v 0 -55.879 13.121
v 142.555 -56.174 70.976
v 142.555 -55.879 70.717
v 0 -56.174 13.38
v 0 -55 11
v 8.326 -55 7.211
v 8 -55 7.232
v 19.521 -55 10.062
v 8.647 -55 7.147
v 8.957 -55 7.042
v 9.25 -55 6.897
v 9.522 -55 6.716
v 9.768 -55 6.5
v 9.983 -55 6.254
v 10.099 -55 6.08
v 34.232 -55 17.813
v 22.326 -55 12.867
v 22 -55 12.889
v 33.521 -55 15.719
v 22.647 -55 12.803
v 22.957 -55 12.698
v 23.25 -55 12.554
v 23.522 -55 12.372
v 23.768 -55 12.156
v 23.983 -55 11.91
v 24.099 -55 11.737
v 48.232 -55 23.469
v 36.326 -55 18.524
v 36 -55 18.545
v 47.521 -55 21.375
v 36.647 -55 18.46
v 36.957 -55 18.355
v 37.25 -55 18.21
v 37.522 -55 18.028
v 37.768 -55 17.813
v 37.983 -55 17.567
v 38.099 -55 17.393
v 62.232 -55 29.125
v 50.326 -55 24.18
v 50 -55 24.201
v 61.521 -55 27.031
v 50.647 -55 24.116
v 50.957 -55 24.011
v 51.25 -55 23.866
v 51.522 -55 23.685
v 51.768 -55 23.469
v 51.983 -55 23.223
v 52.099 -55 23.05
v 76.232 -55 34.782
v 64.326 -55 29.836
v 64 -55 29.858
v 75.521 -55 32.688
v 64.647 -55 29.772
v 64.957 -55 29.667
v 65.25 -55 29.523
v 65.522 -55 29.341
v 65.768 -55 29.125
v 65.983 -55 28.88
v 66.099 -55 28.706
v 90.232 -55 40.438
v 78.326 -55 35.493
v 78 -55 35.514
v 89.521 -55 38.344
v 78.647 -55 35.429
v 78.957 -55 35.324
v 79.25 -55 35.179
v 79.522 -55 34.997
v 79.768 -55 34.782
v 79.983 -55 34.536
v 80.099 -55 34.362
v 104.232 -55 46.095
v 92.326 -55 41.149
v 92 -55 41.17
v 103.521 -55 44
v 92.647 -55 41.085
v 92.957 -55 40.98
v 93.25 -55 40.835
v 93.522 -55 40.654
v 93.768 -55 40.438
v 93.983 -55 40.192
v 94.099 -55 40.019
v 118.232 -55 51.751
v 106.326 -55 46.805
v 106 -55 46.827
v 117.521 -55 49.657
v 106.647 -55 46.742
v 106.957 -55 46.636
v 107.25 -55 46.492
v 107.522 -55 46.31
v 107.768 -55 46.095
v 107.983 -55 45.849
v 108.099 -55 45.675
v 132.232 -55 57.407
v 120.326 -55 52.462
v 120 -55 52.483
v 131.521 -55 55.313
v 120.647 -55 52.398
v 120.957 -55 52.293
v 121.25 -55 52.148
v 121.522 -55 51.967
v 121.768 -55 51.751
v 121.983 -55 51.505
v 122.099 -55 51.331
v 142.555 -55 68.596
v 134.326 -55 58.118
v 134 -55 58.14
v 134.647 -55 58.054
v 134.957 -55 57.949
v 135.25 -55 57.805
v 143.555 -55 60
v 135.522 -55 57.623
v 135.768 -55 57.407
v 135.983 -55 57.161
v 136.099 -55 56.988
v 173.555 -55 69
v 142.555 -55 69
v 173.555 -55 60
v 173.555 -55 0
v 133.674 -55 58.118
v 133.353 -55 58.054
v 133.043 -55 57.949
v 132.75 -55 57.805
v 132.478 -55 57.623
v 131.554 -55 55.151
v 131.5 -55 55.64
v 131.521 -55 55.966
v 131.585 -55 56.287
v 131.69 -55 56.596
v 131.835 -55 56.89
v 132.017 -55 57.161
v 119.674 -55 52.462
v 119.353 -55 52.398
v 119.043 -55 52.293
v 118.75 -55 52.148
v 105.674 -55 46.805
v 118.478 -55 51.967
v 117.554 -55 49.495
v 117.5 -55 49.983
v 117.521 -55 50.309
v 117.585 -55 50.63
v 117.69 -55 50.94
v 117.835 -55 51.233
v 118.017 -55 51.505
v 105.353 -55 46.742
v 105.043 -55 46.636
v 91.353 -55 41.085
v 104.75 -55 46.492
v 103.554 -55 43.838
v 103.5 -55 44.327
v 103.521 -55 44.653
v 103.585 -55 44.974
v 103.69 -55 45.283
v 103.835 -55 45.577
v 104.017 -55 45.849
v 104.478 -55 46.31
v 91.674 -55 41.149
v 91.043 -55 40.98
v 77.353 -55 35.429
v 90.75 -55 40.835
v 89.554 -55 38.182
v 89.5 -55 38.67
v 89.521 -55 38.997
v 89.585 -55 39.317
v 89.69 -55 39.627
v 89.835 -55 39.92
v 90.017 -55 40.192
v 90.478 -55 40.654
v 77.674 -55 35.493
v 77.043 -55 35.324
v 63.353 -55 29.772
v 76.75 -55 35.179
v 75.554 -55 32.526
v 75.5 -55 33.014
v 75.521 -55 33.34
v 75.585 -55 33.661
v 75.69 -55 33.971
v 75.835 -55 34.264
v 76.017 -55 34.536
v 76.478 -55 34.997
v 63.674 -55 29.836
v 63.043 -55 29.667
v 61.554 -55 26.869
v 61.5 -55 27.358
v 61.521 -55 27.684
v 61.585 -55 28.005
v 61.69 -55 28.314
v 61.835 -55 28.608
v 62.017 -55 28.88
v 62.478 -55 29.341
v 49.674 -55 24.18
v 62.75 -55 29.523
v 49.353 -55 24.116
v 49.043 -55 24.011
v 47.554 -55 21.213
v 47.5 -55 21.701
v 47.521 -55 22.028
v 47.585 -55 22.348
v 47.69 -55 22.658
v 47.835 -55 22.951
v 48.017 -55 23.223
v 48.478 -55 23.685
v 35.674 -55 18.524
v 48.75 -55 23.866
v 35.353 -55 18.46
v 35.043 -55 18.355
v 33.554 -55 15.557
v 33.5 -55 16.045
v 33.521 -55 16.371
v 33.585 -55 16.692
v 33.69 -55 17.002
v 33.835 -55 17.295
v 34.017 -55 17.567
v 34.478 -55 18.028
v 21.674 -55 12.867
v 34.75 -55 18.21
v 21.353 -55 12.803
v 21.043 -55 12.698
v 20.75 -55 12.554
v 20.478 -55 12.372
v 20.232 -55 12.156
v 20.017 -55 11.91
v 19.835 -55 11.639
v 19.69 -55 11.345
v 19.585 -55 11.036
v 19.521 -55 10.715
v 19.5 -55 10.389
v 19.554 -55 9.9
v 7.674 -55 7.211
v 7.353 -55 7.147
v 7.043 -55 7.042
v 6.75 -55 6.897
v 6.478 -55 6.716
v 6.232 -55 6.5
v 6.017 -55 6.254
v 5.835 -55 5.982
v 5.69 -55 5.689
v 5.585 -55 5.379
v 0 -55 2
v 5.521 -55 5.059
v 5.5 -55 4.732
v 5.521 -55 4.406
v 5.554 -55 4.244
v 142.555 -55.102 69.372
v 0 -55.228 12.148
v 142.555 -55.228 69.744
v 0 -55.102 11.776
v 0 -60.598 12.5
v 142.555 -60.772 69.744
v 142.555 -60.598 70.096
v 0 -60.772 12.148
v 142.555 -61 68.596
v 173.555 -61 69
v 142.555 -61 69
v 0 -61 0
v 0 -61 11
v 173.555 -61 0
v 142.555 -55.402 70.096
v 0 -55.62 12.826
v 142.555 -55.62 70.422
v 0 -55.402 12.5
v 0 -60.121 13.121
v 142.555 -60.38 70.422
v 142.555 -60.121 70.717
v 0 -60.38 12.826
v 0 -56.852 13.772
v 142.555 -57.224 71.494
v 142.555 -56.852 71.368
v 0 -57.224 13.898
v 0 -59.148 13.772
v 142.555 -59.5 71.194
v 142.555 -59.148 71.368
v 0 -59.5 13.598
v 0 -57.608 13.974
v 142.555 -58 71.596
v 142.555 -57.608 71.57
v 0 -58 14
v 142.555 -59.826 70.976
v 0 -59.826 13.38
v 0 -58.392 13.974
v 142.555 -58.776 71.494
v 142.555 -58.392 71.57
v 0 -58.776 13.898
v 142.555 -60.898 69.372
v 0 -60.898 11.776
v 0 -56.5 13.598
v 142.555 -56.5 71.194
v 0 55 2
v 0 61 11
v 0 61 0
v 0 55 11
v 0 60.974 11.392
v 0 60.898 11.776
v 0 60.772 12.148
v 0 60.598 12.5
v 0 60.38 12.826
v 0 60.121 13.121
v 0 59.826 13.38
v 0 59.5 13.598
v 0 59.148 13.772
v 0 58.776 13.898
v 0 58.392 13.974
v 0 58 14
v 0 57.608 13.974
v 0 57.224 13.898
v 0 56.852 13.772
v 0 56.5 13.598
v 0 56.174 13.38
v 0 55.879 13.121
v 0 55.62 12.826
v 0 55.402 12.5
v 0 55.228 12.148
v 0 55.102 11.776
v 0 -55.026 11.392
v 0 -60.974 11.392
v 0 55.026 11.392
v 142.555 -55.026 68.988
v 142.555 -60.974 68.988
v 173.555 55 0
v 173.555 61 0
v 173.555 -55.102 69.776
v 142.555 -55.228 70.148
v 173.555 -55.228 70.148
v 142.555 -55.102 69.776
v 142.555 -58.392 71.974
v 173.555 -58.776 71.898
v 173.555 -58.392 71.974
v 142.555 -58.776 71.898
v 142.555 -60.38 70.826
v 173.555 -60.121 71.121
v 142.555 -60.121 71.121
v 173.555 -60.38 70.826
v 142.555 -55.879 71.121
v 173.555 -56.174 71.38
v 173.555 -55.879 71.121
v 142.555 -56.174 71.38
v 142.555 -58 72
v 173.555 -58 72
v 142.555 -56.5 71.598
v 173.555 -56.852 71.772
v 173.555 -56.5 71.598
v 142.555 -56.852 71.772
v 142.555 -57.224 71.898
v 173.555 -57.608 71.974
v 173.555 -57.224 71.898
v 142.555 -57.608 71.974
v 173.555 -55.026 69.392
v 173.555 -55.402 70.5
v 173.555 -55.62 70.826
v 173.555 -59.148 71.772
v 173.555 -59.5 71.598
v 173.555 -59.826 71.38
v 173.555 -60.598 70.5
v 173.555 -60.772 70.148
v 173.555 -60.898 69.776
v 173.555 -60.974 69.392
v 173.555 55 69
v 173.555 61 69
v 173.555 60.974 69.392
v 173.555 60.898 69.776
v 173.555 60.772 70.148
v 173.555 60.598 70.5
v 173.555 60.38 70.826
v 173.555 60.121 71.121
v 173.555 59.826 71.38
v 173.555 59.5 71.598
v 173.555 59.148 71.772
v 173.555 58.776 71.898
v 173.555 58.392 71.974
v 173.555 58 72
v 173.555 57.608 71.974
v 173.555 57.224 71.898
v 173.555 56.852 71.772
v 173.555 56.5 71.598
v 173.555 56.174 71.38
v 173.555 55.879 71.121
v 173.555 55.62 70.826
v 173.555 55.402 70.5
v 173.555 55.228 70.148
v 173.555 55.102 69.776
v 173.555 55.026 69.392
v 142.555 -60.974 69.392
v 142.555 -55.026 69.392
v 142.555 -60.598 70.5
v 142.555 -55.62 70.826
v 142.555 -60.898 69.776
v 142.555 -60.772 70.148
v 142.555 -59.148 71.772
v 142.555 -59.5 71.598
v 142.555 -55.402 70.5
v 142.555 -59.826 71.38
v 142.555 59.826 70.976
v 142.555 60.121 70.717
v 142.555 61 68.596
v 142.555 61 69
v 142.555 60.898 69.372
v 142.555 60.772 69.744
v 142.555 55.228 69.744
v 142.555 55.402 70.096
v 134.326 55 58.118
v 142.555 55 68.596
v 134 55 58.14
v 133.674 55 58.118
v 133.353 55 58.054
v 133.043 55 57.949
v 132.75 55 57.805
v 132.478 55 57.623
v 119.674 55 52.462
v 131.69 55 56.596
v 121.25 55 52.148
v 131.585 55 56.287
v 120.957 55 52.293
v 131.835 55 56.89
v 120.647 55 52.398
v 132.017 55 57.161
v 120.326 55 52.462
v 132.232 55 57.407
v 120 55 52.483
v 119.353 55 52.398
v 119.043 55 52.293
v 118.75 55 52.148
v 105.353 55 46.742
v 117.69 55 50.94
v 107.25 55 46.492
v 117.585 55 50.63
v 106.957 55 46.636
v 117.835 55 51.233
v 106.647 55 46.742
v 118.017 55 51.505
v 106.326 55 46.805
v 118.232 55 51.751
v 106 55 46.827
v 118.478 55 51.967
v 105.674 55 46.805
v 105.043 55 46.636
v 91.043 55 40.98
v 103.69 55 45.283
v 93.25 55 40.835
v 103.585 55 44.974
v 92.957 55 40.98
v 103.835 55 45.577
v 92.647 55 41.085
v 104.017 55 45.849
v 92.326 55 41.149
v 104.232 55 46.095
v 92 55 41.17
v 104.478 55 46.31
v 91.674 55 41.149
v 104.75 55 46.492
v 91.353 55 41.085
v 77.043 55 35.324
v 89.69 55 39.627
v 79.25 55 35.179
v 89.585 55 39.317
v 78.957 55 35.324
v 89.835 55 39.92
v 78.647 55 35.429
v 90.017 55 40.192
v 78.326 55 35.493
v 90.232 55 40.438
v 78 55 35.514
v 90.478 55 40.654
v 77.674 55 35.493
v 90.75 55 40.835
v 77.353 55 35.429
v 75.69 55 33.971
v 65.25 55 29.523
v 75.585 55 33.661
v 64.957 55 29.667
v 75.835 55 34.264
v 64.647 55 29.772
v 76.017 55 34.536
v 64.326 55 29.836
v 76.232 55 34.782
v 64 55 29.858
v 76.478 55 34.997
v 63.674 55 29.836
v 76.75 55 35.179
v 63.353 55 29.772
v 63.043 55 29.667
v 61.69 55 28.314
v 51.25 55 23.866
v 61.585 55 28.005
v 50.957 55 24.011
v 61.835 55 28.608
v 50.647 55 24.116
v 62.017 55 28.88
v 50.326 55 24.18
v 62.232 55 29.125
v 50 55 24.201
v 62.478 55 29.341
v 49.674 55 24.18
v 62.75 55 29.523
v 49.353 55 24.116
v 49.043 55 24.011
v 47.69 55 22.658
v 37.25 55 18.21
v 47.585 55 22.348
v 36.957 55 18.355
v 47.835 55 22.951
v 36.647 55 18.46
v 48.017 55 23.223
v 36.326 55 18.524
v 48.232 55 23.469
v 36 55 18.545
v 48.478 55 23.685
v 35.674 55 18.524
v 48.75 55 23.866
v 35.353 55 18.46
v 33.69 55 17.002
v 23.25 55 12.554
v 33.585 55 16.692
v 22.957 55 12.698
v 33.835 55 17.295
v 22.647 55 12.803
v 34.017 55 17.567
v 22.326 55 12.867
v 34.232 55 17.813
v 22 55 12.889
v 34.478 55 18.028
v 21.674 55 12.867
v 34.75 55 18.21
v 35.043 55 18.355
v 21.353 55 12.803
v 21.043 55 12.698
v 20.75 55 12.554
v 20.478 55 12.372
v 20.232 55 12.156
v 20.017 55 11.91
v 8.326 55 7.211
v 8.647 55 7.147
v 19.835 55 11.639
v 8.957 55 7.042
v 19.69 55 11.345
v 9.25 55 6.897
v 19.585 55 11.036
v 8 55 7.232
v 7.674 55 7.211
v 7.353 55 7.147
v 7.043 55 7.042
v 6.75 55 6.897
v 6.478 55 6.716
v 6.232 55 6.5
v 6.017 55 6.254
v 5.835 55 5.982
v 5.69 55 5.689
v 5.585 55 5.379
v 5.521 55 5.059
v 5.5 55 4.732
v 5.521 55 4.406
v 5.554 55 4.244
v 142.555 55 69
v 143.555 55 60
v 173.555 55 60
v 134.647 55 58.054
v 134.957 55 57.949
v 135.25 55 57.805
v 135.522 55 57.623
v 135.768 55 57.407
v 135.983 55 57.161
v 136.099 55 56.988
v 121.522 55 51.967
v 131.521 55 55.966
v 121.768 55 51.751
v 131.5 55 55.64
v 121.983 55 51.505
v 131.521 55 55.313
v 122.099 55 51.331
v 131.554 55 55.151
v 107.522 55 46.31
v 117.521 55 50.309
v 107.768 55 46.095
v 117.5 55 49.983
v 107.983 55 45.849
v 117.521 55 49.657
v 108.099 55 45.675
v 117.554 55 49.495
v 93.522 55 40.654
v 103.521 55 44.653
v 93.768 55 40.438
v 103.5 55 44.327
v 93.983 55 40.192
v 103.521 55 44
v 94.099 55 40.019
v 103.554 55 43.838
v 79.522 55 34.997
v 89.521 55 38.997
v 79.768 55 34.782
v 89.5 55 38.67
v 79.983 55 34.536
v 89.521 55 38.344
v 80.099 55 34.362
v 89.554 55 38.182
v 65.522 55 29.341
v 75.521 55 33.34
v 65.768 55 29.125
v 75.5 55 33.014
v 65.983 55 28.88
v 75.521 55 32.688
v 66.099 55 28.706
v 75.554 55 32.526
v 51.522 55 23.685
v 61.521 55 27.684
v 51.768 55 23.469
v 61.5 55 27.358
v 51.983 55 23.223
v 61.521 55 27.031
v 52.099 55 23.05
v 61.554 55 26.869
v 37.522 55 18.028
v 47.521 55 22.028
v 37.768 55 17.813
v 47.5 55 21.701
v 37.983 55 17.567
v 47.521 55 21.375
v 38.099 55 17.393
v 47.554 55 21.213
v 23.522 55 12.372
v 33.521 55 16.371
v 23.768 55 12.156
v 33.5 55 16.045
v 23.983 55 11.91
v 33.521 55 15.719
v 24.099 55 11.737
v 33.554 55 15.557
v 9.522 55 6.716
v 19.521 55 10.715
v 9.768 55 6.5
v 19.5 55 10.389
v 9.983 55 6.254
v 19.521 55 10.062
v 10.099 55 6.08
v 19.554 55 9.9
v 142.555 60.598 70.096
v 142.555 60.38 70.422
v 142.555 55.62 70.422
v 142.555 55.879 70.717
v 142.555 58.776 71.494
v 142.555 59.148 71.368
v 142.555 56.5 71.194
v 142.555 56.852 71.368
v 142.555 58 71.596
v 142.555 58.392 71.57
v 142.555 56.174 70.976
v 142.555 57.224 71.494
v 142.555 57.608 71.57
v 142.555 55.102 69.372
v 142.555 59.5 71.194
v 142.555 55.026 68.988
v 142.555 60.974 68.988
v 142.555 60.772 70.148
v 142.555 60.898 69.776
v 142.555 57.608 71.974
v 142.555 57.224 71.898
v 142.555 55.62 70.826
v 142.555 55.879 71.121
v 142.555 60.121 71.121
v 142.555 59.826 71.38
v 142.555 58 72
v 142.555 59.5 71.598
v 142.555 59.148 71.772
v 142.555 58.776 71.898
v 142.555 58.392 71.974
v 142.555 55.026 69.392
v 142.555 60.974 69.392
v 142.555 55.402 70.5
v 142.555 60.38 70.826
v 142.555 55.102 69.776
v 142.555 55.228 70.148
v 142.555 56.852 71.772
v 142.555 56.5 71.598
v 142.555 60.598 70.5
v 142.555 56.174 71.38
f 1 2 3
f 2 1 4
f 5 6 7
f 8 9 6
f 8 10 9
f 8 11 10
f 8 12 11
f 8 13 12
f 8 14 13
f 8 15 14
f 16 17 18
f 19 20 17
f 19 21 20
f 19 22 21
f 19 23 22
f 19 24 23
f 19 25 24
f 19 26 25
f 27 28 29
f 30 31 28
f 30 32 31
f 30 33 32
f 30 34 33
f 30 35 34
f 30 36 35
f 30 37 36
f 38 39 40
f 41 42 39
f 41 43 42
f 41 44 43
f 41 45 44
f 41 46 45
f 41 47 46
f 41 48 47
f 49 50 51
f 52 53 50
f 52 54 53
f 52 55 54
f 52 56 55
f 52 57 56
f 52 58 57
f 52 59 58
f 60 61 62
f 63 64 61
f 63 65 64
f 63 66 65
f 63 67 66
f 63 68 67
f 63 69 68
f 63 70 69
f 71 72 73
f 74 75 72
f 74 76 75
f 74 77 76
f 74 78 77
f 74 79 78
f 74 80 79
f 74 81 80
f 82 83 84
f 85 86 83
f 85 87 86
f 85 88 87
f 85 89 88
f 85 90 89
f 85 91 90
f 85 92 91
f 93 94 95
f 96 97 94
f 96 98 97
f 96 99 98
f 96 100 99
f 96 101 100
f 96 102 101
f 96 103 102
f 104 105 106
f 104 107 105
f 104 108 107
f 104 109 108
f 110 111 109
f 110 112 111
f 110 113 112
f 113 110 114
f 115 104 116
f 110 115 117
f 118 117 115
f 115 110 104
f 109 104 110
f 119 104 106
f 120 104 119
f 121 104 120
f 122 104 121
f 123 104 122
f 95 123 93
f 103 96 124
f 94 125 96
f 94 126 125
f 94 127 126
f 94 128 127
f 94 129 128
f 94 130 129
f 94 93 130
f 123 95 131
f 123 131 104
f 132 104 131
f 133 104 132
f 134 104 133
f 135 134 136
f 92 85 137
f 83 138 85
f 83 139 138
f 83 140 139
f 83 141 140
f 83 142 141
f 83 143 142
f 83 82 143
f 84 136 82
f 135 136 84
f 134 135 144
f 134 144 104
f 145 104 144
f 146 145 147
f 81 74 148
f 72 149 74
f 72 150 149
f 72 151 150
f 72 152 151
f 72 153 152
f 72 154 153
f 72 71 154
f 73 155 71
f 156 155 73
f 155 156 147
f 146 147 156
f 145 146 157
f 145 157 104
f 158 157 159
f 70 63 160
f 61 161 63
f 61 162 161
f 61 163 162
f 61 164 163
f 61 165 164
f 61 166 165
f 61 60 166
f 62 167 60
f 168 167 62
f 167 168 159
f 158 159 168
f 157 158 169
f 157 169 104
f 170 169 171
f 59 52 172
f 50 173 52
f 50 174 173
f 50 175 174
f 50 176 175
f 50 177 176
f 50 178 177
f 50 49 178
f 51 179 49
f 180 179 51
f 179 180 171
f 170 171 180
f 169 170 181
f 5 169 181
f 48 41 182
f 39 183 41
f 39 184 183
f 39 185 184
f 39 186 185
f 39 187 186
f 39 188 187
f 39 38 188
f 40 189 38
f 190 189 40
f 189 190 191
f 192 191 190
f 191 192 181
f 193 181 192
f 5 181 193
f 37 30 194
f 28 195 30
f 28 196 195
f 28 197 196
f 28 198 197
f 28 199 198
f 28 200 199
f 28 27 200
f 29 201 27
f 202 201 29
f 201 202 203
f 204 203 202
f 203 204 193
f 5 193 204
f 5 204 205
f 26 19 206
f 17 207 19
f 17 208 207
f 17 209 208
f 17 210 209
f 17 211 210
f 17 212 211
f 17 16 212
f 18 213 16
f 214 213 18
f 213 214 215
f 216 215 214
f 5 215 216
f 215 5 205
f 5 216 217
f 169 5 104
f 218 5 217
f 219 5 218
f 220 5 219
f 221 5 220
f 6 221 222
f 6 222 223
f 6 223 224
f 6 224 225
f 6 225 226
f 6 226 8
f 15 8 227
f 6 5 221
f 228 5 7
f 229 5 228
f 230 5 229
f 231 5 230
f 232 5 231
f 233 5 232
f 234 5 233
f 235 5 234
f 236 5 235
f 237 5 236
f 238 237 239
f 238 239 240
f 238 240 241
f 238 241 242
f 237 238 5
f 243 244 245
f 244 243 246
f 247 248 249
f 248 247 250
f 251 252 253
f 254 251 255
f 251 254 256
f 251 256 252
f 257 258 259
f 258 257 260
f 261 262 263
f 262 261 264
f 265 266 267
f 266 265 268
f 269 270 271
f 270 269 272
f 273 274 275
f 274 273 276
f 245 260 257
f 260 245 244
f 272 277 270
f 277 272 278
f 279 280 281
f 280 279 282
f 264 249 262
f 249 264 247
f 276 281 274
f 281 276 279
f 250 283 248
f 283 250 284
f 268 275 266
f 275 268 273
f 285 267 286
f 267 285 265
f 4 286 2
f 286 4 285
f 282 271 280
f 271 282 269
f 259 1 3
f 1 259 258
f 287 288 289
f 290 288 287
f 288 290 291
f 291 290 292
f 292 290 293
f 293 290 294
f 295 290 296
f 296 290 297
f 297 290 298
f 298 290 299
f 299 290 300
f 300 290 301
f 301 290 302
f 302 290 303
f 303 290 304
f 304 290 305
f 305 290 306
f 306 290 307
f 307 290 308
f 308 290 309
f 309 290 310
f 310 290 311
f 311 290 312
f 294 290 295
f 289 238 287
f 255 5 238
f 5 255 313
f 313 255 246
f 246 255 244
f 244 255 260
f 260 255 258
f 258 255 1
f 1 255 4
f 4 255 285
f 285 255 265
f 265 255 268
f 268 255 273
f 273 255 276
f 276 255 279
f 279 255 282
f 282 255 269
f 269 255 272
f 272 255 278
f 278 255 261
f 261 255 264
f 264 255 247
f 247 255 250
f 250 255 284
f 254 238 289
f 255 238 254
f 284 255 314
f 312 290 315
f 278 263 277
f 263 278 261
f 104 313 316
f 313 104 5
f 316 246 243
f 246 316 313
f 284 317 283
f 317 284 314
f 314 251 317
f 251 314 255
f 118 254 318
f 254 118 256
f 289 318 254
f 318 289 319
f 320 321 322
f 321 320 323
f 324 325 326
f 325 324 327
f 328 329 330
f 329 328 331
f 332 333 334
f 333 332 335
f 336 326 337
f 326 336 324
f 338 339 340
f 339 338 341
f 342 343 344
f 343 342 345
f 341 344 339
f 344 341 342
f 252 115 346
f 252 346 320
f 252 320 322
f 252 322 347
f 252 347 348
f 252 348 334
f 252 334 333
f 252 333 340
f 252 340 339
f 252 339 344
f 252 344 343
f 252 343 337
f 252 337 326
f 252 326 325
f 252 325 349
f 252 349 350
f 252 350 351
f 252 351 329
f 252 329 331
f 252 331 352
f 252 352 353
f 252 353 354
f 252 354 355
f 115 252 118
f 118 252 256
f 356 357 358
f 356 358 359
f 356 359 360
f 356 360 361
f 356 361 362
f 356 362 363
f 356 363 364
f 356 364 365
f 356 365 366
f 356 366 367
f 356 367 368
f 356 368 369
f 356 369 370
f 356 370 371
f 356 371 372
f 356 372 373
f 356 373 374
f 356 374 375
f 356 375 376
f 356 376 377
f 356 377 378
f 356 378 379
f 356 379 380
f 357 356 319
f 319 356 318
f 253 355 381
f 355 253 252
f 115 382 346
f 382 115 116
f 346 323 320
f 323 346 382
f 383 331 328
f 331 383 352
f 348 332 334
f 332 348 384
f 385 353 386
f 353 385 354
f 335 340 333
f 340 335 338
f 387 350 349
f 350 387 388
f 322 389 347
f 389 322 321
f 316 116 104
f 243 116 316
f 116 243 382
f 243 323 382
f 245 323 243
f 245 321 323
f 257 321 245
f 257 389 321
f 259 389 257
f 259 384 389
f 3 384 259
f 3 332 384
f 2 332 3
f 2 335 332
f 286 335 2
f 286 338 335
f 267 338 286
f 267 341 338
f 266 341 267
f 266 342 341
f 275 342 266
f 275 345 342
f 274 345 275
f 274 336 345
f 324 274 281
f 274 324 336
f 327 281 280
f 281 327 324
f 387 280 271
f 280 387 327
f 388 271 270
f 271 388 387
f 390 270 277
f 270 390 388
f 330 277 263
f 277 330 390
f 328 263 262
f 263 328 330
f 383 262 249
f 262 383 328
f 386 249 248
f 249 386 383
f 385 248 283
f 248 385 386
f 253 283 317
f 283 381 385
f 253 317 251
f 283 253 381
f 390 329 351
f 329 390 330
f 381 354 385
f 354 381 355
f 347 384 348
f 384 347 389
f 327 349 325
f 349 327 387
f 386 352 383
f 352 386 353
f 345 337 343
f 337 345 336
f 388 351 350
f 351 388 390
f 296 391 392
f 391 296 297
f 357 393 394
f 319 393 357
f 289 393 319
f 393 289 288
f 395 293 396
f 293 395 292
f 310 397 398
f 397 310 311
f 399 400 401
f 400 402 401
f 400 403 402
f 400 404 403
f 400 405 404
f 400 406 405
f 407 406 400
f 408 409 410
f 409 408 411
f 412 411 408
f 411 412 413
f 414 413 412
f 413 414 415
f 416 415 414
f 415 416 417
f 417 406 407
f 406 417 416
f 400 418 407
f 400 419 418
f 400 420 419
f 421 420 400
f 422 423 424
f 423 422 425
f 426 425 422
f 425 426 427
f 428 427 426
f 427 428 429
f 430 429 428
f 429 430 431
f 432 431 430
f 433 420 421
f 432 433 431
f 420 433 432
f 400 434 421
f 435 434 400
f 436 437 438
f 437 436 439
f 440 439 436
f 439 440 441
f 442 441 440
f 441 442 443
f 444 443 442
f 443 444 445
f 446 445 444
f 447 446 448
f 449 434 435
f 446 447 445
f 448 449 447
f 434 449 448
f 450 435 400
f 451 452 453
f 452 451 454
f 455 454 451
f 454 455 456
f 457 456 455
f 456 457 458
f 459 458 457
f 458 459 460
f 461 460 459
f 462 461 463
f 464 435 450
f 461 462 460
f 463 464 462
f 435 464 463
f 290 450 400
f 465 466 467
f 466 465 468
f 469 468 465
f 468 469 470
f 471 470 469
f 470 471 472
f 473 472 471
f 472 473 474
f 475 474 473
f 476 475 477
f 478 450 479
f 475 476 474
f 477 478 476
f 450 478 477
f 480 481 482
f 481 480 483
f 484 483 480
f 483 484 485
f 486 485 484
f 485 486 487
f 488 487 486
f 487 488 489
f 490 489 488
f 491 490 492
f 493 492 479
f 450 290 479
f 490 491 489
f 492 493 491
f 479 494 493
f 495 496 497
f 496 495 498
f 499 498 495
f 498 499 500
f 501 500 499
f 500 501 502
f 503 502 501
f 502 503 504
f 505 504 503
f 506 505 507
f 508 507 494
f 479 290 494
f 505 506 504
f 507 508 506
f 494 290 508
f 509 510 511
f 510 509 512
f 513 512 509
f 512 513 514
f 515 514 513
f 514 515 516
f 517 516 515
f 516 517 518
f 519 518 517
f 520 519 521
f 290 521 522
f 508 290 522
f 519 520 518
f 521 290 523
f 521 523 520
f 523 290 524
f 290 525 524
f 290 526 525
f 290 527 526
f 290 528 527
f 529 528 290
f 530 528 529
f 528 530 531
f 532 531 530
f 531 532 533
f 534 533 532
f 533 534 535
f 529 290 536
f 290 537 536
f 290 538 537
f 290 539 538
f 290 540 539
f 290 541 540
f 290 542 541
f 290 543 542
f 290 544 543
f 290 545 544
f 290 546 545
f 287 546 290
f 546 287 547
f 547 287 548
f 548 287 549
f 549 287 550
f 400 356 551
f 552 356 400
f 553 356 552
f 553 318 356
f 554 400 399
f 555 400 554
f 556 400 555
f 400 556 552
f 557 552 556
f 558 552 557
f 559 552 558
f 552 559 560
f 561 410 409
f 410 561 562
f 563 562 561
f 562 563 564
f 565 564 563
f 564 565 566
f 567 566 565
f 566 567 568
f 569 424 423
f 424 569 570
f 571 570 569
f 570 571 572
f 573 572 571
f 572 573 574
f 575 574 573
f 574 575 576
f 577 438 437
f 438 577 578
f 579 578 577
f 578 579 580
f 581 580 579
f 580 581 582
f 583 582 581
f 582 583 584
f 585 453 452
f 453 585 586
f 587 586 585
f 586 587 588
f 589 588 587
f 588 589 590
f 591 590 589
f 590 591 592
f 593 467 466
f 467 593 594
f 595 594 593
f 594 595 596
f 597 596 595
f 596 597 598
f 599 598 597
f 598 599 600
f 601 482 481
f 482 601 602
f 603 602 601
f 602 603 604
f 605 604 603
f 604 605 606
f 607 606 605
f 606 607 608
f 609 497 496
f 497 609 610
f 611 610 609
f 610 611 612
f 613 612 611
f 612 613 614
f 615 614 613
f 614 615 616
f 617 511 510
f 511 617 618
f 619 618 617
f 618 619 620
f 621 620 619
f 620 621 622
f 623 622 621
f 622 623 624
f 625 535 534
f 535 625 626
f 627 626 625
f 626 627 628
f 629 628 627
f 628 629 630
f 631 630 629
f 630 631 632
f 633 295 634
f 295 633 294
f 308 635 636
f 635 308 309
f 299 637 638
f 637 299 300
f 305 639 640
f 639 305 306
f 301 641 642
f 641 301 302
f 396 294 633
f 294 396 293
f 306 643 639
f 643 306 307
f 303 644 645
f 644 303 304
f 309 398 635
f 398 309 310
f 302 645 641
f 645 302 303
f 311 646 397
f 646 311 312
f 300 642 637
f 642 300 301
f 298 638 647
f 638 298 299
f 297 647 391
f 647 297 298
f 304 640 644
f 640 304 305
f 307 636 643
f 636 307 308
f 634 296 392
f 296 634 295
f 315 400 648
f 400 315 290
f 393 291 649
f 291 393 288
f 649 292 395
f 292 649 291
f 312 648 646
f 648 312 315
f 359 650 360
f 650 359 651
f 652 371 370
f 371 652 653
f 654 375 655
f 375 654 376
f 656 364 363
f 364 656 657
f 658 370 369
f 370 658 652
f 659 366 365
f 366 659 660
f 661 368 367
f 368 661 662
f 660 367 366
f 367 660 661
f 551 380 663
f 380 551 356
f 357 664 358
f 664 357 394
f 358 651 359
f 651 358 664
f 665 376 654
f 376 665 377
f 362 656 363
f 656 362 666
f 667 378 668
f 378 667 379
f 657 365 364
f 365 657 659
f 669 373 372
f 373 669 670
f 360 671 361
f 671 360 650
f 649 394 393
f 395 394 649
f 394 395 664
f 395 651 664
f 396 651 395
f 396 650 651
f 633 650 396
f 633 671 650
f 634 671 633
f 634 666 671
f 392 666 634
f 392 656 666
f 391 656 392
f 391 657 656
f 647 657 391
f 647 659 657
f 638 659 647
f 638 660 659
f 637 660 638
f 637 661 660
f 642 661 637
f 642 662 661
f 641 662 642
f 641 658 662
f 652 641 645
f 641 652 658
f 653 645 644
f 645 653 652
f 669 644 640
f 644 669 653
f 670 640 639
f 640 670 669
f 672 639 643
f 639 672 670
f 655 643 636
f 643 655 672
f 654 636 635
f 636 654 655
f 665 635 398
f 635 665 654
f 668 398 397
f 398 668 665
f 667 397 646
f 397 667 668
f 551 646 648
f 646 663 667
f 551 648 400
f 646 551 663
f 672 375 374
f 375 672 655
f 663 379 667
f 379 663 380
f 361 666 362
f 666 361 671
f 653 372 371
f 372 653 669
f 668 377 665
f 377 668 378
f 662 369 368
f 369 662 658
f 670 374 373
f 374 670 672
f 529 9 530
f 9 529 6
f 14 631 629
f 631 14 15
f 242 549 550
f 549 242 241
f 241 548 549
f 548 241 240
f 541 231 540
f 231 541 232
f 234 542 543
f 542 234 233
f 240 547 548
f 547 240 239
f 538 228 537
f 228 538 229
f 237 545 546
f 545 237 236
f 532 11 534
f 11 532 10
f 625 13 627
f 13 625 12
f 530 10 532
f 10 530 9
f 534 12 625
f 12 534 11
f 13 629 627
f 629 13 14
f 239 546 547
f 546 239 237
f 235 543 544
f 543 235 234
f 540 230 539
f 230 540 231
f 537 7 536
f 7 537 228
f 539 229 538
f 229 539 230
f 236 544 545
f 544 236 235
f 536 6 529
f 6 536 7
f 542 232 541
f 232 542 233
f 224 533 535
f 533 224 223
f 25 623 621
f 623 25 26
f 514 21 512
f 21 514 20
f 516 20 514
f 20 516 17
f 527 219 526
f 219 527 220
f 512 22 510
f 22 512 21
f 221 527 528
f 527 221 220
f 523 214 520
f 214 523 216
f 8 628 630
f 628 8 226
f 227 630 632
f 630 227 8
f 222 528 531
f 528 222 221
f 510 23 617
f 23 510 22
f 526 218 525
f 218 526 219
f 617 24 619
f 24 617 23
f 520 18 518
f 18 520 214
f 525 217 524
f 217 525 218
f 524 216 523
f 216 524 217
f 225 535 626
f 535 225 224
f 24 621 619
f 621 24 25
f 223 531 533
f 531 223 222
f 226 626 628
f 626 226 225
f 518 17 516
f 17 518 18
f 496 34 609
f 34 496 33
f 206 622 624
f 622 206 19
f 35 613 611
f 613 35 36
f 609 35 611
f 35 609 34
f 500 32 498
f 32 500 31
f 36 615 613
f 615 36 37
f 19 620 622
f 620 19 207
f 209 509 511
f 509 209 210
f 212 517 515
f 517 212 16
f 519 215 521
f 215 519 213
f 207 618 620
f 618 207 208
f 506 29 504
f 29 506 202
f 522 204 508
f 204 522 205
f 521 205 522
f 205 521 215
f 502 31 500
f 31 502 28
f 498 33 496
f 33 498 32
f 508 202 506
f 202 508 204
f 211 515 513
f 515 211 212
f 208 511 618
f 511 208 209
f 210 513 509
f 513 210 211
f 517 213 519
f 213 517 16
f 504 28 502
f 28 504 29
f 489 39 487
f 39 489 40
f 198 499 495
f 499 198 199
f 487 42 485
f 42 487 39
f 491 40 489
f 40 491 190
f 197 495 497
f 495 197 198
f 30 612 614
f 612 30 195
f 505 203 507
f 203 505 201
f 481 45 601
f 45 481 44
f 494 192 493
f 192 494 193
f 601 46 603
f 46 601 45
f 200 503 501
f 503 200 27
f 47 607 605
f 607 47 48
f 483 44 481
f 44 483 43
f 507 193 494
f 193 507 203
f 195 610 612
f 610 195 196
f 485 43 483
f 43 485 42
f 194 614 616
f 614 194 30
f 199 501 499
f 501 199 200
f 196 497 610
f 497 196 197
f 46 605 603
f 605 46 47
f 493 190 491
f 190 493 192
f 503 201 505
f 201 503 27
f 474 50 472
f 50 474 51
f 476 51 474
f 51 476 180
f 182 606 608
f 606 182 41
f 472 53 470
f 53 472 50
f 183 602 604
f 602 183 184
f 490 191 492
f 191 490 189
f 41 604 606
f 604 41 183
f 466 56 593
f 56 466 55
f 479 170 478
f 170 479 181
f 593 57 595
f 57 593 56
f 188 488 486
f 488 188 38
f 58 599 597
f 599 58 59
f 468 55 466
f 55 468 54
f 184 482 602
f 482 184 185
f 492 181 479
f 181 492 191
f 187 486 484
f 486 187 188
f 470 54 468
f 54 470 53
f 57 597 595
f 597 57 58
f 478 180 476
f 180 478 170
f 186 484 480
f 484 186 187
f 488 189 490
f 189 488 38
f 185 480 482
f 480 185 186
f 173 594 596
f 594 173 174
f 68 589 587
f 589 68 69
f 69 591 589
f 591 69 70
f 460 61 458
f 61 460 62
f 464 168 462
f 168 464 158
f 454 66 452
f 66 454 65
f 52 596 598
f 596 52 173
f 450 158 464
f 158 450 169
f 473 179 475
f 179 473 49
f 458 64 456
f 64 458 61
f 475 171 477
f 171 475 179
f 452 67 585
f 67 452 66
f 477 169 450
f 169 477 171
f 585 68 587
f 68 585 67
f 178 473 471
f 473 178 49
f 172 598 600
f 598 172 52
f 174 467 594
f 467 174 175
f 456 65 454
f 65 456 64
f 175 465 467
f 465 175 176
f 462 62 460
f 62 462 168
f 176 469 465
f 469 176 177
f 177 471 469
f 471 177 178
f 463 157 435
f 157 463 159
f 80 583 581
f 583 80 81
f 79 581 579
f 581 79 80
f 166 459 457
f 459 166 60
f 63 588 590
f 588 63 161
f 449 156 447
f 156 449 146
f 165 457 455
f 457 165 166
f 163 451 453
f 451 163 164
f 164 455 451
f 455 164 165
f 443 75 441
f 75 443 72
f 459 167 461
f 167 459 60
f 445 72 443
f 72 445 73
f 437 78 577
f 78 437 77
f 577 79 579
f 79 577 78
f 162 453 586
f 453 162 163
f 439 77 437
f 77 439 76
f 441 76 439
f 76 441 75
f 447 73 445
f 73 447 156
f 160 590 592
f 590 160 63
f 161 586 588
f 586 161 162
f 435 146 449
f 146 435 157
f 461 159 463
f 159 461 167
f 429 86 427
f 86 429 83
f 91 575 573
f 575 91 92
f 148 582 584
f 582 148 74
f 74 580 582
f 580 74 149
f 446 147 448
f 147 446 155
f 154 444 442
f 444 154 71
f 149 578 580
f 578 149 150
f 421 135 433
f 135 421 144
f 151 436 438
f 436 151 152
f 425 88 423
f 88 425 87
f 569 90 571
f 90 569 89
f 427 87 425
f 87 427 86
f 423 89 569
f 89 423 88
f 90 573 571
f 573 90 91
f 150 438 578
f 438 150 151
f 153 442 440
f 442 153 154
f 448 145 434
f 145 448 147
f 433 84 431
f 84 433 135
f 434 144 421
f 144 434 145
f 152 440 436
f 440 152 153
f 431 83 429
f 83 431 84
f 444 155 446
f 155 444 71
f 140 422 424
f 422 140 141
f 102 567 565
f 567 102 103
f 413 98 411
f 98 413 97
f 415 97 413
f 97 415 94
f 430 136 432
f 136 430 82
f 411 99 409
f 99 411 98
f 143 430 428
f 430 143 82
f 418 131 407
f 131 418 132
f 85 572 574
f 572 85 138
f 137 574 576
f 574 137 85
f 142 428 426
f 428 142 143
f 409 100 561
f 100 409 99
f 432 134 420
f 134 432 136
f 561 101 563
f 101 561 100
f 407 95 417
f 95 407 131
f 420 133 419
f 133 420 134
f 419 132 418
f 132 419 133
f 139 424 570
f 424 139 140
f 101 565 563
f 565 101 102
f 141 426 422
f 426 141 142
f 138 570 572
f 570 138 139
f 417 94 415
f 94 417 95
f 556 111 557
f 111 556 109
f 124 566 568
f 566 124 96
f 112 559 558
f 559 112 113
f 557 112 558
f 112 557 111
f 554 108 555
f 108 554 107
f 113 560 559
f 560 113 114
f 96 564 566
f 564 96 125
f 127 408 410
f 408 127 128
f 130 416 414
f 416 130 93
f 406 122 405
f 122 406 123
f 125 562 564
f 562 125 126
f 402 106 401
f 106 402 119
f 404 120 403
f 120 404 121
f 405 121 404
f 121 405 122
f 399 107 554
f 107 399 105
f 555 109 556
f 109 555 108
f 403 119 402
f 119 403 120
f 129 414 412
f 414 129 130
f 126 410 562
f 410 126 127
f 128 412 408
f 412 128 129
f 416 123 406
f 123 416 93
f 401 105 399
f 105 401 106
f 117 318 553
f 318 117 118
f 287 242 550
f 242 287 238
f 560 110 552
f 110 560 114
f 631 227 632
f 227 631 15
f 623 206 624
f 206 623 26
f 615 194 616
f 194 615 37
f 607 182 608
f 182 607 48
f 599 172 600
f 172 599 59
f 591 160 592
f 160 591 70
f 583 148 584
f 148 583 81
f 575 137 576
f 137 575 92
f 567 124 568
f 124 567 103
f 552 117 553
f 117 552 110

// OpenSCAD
// ============================================================
//  BROUTILLE — rampe de marche pour juvénile
//  - franchit une bordure (planche, parpaing, bord de bac) de
//    hauteur réglable, 60 mm par défaut
//  - pente de 22° au plus : un juvénile la monte sans glisser,
//    et la descend sans basculer sur le dos
//  - nervures rondes en travers, tous les 14 mm : prise pour les
//    griffes, rien de coupant
//  - côtés bas et arrondis : la tortue ne tombe pas sur le côté,
//    et reste visible
//  - palier en haut, au niveau de la bordure ; une rampe de chaque
//    côté pour passer dans les deux sens
//  - au-delà de 236 mm, la rampe est coupée en tronçons qui
//    s'emboîtent par une queue d'aronde verticale
//
//  À plat, sans supports, pour un plateau de 256 x 256 mm.
//  Repère : X = montée (pied en X = 0), Y = largeur, Z = haut.
// ============================================================

piece   = "rampe"; // [rampe, assemblage]
troncon = 0;       // quel tronçon, si la rampe est coupée (0 = pied)

/* [Bordure] */
hauteur = 60;     // hauteur de la bordure à franchir, en mm
pente   = 22;     // angle de la montée, 25° au plus

/* [Rampe] */
larg    = 110;    // largeur de passage entre les côtés
pied    = 2;      // épaisseur au pied
palier  = 30;     // palier en haut, contre la bordure
cote_e  = 6;      // épaisseur d'un côté
cote_h  = 12;     // hauteur d'un côté au-dessus de la marche
pas     = 14;     // écart des nervures
nerv_d  = 5;      // diamètre des nervures
nerv_s  = 2;      // saillie des nervures

/* [Tronçons] */
l_max   = 236;    // longueur maximale d'un tronçon, sans la queue d'aronde
jeu     = 0.25;   // jeu de l'emboîtement, de chaque côté
qa_col  = 14;     // largeur du col de la queue d'aronde
qa_bout = 22;     // largeur du bout
qa_l    = 14;     // longueur

$fn = 48;

assert(pente <= 25, "pente trop forte : 25° au plus");
assert(hauteur > pied + 5, "bordure trop basse");

// ------------------------------------------------------------
tp   = tan(pente);
x_h  = (hauteur - pied)/tp;   // fin de la montée
L    = x_h + palier;          // longueur totale
W    = larg + 2*cote_e;       // largeur totale
n    = ceil(L/l_max);         // nombre de tronçons
coupes = [for (k = [0 : n]) k*L/n];
function z_marche(x) = x >= x_h ? hauteur : pied + x*tp;

module corps() {
    rotate([90, 0, 0]) linear_extrude(W, center = true)
        polygon([[0, 0], [L, 0], [L, hauteur], [x_h, hauteur], [0, pied]]);
}

// section d'un côté, dans le plan YZ : droit, dessus en demi-rond
module section_cote(h) {
    translate([-cote_e/2, -200]) square([cote_e, 200 + h - cote_e/2]);
    translate([0, h - cote_e/2]) circle(d = cote_e);
}
module cote(yc) {
    // montée : la section est cisaillée le long de la pente, elle reste verticale
    intersection() {
        multmatrix([[1, 0, 0, 0], [0, 1, 0, yc], [tp, 0, 1, 0], [0, 0, 0, 1]])
            rotate([90, 0, 90]) linear_extrude(x_h) section_cote(pied + cote_h);
        translate([-1, -W, 0]) cube([x_h + 2, 2*W, hauteur + cote_h + 10]);
    }
    // palier
    translate([x_h - 1, yc, 0]) rotate([90, 0, 90]) linear_extrude(palier + 1)
        intersection() { section_cote(hauteur + cote_h); translate([-W, 0]) square([2*W, hauteur + cote_h + 10]); }
}

module nervures() {
    for (x = [8 : pas : x_h - 6])
        translate([x, 0, z_marche(x) + nerv_s - nerv_d/2]) rotate([90, 0, 0])
            cylinder(d = nerv_d, h = larg + 1, center = true);
}

module rampe() {
    corps();
    for (s = [-1, 1]) cote(s*(larg/2 + cote_e/2));
    nervures();
}

// queue d'aronde : vue de dessus, le col sur la coupe, le bout dans le tronçon suivant
module aronde2d(j = 0) {
    polygon([[-1, -qa_col/2 - j], [0, -qa_col/2 - j], [qa_l + j, -qa_bout/2 - j],
             [qa_l + j, qa_bout/2 + j], [0, qa_col/2 + j], [-1, qa_col/2 + j]]);
}
function h_tenon(x) = min(35, z_marche(x) - 6 - qa_bout/2);
module tenon(x) { translate([x - 0.5, 0, 0]) linear_extrude(h_tenon(x)) translate([0.5, 0]) aronde2d(); }
// mortaise : ouverte en dessous et sur la coupe, plafond en toit à 45°, rien à ponter
module mortaise(x) {
    h = h_tenon(x) + 0.4;
    translate([x, 0, 0]) hull() {
        translate([0, 0, -1]) linear_extrude(h + 1) aronde2d(jeu);
        translate([-1, -0.05, h + qa_bout/2 + jeu]) cube([qa_l + jeu + 1, 0.1, 0.01]);
    }
}

module morceau(k) {
    x0 = coupes[k]; x1 = coupes[k + 1];
    translate([-x0, 0, 0]) difference() {
        union() {
            intersection() {
                rampe();
                translate([x0, -W, -1]) cube([x1 - x0, 2*W, hauteur + cote_h + 20]);
            }
            if (k < n - 1) tenon(x1);
        }
        if (k > 0) mortaise(x0);
    }
}

echo(str("rampe : ", round(L), " x ", W, " mm, ", n, " tronçon(s)"));

// ------------------------------------------------------------
if (piece == "rampe") morceau(min(troncon, n - 1));
else {
    for (k = [0 : n - 1]) color(k % 2 ? "SlateGray" : "LightSlateGray")
        translate([coupes[k] + k*6, 0, 0]) morceau(k);
    // la bordure, et la rampe de l'autre côté
    %translate([L + (n - 1)*6, -W, 0]) cube([50, 2*W, hauteur]);
    %translate([2*L + (n - 1)*6 + 50, 0, 0]) mirror([1, 0, 0]) rampe();
}
